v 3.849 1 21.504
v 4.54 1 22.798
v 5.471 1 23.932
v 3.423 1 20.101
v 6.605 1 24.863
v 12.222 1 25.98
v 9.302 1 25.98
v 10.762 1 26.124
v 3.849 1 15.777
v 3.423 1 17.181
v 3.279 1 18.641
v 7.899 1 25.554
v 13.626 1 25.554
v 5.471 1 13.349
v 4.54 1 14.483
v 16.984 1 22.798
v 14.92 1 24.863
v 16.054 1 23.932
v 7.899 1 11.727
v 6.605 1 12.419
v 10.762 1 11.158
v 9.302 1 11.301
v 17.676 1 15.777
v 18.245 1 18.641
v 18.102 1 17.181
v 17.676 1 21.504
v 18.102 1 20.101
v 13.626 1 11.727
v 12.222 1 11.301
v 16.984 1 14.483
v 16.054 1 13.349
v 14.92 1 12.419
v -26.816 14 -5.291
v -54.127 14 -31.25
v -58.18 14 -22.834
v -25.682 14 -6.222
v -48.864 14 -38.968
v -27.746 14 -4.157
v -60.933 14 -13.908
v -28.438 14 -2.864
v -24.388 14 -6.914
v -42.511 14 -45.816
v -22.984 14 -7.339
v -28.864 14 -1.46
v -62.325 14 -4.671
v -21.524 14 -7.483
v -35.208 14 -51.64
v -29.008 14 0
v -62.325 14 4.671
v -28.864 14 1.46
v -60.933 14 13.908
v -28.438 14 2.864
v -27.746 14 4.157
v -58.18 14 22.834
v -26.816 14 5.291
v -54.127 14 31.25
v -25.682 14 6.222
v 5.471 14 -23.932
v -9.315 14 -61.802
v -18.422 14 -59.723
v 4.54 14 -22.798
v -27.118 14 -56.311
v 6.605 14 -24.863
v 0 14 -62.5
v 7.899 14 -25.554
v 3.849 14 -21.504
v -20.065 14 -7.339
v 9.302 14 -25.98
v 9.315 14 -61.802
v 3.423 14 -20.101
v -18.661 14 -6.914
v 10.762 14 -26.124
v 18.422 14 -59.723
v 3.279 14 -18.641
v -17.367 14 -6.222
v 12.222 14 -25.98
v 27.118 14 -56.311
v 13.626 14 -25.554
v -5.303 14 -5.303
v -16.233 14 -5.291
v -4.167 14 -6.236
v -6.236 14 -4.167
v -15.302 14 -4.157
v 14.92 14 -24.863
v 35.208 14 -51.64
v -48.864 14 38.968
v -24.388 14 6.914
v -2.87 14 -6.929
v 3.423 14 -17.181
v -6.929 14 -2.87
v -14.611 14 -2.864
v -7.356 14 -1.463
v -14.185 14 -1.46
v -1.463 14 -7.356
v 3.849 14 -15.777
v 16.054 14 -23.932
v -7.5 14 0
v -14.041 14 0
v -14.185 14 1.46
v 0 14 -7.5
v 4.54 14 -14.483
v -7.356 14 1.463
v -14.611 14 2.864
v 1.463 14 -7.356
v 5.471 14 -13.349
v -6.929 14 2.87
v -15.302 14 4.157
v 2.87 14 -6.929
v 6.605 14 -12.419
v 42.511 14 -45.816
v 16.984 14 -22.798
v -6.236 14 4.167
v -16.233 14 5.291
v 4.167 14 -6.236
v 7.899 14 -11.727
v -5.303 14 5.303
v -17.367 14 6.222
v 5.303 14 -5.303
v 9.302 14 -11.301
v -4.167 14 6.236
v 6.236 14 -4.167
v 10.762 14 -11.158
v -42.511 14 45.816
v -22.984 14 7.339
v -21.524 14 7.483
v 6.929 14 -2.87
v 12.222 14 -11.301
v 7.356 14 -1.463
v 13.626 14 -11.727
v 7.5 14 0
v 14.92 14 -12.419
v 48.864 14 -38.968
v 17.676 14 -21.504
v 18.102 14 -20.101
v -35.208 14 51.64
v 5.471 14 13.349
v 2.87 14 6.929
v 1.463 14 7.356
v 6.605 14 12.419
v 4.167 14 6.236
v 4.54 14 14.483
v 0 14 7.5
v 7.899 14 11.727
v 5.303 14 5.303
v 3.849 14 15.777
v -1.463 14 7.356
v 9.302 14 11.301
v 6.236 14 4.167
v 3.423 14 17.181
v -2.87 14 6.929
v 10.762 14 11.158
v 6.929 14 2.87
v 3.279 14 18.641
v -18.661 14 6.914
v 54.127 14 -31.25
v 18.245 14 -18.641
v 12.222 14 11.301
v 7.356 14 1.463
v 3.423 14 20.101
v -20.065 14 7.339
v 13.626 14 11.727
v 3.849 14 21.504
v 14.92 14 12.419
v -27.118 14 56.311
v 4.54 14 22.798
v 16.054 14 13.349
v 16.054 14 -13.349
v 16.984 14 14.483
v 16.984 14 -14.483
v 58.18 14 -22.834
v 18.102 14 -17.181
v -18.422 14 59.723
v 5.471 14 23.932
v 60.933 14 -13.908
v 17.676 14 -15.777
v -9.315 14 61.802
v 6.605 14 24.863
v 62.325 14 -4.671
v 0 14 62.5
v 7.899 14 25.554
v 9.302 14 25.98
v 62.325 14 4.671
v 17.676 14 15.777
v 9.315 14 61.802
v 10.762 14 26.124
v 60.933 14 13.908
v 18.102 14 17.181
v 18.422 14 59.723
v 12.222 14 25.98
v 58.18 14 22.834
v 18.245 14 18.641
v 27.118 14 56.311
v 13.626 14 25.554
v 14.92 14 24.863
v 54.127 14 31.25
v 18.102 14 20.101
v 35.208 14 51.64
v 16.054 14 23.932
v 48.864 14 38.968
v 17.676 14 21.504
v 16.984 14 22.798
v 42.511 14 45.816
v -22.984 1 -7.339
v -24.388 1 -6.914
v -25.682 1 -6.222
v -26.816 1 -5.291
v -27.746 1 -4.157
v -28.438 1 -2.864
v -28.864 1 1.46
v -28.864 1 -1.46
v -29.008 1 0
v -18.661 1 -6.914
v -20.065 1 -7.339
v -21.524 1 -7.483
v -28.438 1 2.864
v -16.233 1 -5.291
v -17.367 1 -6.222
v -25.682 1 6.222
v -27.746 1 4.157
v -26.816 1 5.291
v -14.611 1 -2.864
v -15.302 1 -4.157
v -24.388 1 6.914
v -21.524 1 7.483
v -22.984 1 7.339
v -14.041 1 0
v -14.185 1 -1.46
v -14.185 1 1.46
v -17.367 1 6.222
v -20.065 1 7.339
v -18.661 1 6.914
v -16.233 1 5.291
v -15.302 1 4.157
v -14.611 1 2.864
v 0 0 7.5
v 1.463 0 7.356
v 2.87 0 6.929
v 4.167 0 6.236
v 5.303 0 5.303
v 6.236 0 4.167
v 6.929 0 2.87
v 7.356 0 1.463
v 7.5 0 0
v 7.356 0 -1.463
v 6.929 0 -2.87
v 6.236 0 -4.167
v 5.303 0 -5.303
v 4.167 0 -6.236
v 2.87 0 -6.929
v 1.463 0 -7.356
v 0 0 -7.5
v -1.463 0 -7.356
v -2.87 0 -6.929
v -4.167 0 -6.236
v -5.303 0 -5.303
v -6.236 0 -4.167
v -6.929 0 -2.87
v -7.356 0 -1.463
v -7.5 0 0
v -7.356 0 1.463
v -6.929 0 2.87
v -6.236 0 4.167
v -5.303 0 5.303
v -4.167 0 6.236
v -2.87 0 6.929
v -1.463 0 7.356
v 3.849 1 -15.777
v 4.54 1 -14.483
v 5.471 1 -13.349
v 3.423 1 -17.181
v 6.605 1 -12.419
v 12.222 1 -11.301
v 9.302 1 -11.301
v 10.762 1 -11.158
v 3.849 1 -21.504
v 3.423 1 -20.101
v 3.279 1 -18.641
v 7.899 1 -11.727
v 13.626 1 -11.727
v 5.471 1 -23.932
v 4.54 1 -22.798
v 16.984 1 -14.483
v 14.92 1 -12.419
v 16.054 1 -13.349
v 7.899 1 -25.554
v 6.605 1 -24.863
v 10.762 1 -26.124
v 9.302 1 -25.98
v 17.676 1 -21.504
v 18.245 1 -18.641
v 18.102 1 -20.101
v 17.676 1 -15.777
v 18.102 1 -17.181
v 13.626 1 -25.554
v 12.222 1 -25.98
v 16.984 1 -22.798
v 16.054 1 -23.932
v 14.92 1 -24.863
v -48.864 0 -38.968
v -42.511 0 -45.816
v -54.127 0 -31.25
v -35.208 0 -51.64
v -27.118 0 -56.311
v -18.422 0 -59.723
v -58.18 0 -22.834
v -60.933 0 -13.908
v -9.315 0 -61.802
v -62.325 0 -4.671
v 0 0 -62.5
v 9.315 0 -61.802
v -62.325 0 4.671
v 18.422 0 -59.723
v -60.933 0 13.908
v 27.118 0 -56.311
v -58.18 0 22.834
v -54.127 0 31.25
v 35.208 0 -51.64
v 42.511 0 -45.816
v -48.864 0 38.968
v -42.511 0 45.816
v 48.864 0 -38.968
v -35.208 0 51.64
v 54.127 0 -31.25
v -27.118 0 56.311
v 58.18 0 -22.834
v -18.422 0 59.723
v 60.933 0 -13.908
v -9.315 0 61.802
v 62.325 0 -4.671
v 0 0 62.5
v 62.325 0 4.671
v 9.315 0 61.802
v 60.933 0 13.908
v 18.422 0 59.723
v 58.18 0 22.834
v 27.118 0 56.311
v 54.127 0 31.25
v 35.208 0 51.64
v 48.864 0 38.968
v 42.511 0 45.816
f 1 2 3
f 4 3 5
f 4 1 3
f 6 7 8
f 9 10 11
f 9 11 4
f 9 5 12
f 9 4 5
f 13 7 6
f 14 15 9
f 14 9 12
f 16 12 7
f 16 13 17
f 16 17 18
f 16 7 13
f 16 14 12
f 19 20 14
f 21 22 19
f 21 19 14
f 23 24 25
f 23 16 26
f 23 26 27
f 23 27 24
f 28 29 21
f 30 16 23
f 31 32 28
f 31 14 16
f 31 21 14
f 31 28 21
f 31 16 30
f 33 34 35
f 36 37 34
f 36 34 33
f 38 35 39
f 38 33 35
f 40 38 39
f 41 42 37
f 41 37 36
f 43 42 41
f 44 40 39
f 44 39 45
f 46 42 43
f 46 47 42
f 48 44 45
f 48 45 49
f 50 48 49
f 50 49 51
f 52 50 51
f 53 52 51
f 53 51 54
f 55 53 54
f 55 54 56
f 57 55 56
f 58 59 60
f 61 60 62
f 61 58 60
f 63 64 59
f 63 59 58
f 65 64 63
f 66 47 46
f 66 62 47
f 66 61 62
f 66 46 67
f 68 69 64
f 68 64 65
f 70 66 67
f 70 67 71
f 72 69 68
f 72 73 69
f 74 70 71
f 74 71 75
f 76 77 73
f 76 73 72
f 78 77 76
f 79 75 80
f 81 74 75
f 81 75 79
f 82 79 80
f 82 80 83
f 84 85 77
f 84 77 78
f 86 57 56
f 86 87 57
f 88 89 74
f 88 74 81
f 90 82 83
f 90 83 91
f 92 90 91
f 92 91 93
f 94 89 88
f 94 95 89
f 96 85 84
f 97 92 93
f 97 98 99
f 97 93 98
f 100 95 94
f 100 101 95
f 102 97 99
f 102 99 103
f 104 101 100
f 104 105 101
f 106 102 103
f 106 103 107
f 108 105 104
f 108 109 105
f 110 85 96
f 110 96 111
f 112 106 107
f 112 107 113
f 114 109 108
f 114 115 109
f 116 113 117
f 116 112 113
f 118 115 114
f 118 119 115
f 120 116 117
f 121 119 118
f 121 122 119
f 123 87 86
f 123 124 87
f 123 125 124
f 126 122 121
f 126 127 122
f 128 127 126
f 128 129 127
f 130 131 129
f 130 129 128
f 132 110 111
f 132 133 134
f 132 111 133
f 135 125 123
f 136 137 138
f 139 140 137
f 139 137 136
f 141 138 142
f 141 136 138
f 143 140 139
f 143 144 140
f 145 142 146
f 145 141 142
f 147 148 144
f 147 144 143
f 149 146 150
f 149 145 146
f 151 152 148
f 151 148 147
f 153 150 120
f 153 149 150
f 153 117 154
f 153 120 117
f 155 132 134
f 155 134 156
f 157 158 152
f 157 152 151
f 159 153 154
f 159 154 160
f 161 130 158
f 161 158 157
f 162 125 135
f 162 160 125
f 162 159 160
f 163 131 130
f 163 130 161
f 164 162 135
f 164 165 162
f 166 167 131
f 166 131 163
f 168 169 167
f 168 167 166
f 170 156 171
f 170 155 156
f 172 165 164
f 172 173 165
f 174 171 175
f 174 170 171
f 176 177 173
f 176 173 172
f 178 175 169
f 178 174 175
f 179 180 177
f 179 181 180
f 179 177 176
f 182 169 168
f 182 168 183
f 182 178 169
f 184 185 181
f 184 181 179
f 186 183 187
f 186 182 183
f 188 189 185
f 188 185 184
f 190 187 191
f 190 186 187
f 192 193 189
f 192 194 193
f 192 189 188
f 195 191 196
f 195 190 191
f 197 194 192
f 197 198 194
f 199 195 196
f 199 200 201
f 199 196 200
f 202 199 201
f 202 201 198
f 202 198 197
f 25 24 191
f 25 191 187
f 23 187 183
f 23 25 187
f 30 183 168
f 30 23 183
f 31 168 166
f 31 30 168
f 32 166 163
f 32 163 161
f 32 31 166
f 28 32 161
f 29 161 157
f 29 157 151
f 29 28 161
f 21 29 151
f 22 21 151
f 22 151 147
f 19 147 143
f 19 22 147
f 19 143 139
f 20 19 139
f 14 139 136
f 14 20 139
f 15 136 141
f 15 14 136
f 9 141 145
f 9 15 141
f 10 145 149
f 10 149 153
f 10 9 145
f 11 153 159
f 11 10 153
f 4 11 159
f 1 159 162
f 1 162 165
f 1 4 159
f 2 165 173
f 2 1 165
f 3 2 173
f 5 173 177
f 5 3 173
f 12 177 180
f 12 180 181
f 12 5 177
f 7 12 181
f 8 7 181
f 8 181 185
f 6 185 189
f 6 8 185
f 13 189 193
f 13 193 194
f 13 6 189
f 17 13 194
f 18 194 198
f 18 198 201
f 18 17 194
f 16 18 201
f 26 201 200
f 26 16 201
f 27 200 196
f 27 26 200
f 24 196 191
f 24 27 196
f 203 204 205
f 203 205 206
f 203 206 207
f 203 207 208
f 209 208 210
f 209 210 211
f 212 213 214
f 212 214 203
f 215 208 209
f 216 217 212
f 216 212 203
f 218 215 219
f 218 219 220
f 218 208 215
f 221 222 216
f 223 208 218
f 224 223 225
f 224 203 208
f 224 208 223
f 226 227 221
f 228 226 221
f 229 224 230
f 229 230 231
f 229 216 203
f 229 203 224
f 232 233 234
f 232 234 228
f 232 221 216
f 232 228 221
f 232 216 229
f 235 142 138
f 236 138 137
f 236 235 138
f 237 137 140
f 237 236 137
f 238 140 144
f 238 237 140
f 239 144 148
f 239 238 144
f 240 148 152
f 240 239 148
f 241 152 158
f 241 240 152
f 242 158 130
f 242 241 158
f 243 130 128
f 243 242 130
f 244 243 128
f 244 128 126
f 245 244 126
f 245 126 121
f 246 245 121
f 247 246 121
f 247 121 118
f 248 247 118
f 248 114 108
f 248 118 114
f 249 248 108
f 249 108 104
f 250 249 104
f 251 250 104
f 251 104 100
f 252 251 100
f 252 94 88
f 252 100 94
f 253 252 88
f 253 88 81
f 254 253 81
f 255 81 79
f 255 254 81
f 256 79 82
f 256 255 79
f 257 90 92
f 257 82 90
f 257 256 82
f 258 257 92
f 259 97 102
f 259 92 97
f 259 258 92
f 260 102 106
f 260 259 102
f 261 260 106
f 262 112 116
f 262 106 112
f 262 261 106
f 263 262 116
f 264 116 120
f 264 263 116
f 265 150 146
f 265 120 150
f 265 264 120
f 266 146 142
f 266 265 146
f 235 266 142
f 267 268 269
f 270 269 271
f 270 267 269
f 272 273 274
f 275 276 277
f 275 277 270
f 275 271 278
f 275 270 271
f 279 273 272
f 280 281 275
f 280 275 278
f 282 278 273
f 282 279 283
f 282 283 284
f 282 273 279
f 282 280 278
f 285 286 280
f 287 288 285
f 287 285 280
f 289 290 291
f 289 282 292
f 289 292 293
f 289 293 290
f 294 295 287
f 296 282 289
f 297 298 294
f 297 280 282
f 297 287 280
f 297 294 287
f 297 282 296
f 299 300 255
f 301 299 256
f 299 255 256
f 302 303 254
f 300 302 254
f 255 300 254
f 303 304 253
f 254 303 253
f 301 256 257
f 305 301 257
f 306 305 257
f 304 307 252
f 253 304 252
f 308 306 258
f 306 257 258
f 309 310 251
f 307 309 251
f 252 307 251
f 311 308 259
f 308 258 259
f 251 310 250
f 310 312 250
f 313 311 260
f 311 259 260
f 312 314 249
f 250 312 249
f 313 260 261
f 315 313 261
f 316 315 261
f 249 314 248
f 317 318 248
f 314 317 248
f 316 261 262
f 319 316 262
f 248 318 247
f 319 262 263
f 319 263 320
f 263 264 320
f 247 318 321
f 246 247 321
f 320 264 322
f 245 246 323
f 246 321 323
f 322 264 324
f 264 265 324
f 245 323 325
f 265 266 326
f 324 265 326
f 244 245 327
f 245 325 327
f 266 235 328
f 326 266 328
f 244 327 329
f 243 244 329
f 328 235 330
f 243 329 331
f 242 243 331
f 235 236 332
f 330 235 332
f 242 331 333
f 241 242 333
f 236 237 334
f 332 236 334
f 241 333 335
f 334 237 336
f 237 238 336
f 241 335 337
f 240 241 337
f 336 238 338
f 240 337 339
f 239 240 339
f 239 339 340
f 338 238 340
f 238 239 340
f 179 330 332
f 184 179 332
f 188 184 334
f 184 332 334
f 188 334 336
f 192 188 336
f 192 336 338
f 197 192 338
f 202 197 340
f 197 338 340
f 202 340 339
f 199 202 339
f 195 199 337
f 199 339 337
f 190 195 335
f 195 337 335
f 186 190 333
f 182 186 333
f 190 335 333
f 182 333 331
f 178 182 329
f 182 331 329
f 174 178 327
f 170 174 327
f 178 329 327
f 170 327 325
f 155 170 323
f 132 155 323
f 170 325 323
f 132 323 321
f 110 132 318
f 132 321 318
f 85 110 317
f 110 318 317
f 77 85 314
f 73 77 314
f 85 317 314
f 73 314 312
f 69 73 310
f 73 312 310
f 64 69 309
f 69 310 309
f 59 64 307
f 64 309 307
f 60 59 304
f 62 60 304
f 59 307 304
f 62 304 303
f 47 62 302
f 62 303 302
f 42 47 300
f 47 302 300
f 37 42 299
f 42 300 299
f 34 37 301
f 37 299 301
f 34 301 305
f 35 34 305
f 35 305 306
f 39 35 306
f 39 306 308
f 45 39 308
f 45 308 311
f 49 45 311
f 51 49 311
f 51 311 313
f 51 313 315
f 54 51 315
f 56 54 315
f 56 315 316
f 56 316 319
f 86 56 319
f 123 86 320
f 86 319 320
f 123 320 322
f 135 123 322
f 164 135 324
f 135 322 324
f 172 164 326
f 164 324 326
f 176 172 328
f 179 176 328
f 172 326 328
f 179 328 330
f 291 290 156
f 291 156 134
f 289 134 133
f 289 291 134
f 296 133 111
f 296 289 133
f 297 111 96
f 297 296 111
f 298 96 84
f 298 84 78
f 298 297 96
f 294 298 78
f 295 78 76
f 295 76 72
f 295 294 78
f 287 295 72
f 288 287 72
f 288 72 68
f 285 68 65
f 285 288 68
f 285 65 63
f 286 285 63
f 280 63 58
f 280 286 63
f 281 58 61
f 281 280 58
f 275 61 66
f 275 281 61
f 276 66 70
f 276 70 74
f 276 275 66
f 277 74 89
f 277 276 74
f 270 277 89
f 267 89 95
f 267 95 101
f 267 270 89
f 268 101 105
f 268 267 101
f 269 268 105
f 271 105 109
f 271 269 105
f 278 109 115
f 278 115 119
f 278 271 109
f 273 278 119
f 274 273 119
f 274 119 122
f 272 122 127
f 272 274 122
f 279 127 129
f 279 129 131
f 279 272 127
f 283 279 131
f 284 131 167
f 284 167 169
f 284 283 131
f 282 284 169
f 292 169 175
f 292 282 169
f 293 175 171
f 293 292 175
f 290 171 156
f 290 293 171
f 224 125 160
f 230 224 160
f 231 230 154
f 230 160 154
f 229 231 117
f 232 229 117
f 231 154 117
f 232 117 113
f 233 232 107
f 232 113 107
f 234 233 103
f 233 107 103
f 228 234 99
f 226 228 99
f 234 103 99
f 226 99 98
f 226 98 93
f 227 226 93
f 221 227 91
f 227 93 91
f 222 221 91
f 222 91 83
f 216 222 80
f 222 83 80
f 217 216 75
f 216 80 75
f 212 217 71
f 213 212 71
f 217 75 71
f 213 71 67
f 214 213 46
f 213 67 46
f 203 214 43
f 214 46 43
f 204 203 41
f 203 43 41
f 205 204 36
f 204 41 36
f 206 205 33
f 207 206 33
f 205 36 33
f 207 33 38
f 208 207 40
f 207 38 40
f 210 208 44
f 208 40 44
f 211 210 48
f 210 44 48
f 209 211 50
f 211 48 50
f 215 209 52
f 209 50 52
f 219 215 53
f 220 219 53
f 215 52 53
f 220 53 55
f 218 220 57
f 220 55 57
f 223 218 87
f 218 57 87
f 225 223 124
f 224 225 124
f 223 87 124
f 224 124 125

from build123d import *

# Parameters (mm, degrees)
SKETCH1_R           = 62.5
BOSS_EXTRUDE1_DEPTH = 14
SKETCH2_R           = 7.5
CUT_EXTRUDE1_DEPTH  = 90.49022293
SKETCH3_R           = 7.483126217
CUT_EXTRUDE2_DEPTH  = 13.000433881
CIRPATTERN1_COUNT   = 3


with BuildPart() as part:
    # Sketch1 → Boss-Extrude1 (new body)
    with BuildSketch(Plane(origin=(0, 0, 0), x_dir=(1, 0, 0), z_dir=(0, 1, 0))):
        Circle(SKETCH1_R)
    extrude(amount=BOSS_EXTRUDE1_DEPTH)

    # Sketch2 → Cut-Extrude1 (cut, through all)
    with BuildSketch(Plane(origin=(0, 0, 0), x_dir=(1, 0, 0), z_dir=(0, 1, 0))):
        Circle(SKETCH2_R)
    extrude(amount=CUT_EXTRUDE1_DEPTH, mode=Mode.SUBTRACT)

    # Sketch3 → Cut-Extrude2 (cut)
    with BuildSketch(Plane(origin=(0, 14, 0), x_dir=(1, 0, 0), z_dir=(0, 1, 0))):
        with Locations((-21.524422903, 0)):
            Circle(SKETCH3_R)
    cut_extrude2 = extrude(amount=-CUT_EXTRUDE2_DEPTH, mode=Mode.SUBTRACT)

    # CirPattern1: Cut-Extrude2 ×3 about axis
    cirpattern1_axis = Axis((0, 0, 0), (0, 1, 0))
    for i in range(1, CIRPATTERN1_COUNT):
        add(cut_extrude2.rotate(cirpattern1_axis, i * 360 / CIRPATTERN1_COUNT), mode=Mode.SUBTRACT)


solid = part.part
